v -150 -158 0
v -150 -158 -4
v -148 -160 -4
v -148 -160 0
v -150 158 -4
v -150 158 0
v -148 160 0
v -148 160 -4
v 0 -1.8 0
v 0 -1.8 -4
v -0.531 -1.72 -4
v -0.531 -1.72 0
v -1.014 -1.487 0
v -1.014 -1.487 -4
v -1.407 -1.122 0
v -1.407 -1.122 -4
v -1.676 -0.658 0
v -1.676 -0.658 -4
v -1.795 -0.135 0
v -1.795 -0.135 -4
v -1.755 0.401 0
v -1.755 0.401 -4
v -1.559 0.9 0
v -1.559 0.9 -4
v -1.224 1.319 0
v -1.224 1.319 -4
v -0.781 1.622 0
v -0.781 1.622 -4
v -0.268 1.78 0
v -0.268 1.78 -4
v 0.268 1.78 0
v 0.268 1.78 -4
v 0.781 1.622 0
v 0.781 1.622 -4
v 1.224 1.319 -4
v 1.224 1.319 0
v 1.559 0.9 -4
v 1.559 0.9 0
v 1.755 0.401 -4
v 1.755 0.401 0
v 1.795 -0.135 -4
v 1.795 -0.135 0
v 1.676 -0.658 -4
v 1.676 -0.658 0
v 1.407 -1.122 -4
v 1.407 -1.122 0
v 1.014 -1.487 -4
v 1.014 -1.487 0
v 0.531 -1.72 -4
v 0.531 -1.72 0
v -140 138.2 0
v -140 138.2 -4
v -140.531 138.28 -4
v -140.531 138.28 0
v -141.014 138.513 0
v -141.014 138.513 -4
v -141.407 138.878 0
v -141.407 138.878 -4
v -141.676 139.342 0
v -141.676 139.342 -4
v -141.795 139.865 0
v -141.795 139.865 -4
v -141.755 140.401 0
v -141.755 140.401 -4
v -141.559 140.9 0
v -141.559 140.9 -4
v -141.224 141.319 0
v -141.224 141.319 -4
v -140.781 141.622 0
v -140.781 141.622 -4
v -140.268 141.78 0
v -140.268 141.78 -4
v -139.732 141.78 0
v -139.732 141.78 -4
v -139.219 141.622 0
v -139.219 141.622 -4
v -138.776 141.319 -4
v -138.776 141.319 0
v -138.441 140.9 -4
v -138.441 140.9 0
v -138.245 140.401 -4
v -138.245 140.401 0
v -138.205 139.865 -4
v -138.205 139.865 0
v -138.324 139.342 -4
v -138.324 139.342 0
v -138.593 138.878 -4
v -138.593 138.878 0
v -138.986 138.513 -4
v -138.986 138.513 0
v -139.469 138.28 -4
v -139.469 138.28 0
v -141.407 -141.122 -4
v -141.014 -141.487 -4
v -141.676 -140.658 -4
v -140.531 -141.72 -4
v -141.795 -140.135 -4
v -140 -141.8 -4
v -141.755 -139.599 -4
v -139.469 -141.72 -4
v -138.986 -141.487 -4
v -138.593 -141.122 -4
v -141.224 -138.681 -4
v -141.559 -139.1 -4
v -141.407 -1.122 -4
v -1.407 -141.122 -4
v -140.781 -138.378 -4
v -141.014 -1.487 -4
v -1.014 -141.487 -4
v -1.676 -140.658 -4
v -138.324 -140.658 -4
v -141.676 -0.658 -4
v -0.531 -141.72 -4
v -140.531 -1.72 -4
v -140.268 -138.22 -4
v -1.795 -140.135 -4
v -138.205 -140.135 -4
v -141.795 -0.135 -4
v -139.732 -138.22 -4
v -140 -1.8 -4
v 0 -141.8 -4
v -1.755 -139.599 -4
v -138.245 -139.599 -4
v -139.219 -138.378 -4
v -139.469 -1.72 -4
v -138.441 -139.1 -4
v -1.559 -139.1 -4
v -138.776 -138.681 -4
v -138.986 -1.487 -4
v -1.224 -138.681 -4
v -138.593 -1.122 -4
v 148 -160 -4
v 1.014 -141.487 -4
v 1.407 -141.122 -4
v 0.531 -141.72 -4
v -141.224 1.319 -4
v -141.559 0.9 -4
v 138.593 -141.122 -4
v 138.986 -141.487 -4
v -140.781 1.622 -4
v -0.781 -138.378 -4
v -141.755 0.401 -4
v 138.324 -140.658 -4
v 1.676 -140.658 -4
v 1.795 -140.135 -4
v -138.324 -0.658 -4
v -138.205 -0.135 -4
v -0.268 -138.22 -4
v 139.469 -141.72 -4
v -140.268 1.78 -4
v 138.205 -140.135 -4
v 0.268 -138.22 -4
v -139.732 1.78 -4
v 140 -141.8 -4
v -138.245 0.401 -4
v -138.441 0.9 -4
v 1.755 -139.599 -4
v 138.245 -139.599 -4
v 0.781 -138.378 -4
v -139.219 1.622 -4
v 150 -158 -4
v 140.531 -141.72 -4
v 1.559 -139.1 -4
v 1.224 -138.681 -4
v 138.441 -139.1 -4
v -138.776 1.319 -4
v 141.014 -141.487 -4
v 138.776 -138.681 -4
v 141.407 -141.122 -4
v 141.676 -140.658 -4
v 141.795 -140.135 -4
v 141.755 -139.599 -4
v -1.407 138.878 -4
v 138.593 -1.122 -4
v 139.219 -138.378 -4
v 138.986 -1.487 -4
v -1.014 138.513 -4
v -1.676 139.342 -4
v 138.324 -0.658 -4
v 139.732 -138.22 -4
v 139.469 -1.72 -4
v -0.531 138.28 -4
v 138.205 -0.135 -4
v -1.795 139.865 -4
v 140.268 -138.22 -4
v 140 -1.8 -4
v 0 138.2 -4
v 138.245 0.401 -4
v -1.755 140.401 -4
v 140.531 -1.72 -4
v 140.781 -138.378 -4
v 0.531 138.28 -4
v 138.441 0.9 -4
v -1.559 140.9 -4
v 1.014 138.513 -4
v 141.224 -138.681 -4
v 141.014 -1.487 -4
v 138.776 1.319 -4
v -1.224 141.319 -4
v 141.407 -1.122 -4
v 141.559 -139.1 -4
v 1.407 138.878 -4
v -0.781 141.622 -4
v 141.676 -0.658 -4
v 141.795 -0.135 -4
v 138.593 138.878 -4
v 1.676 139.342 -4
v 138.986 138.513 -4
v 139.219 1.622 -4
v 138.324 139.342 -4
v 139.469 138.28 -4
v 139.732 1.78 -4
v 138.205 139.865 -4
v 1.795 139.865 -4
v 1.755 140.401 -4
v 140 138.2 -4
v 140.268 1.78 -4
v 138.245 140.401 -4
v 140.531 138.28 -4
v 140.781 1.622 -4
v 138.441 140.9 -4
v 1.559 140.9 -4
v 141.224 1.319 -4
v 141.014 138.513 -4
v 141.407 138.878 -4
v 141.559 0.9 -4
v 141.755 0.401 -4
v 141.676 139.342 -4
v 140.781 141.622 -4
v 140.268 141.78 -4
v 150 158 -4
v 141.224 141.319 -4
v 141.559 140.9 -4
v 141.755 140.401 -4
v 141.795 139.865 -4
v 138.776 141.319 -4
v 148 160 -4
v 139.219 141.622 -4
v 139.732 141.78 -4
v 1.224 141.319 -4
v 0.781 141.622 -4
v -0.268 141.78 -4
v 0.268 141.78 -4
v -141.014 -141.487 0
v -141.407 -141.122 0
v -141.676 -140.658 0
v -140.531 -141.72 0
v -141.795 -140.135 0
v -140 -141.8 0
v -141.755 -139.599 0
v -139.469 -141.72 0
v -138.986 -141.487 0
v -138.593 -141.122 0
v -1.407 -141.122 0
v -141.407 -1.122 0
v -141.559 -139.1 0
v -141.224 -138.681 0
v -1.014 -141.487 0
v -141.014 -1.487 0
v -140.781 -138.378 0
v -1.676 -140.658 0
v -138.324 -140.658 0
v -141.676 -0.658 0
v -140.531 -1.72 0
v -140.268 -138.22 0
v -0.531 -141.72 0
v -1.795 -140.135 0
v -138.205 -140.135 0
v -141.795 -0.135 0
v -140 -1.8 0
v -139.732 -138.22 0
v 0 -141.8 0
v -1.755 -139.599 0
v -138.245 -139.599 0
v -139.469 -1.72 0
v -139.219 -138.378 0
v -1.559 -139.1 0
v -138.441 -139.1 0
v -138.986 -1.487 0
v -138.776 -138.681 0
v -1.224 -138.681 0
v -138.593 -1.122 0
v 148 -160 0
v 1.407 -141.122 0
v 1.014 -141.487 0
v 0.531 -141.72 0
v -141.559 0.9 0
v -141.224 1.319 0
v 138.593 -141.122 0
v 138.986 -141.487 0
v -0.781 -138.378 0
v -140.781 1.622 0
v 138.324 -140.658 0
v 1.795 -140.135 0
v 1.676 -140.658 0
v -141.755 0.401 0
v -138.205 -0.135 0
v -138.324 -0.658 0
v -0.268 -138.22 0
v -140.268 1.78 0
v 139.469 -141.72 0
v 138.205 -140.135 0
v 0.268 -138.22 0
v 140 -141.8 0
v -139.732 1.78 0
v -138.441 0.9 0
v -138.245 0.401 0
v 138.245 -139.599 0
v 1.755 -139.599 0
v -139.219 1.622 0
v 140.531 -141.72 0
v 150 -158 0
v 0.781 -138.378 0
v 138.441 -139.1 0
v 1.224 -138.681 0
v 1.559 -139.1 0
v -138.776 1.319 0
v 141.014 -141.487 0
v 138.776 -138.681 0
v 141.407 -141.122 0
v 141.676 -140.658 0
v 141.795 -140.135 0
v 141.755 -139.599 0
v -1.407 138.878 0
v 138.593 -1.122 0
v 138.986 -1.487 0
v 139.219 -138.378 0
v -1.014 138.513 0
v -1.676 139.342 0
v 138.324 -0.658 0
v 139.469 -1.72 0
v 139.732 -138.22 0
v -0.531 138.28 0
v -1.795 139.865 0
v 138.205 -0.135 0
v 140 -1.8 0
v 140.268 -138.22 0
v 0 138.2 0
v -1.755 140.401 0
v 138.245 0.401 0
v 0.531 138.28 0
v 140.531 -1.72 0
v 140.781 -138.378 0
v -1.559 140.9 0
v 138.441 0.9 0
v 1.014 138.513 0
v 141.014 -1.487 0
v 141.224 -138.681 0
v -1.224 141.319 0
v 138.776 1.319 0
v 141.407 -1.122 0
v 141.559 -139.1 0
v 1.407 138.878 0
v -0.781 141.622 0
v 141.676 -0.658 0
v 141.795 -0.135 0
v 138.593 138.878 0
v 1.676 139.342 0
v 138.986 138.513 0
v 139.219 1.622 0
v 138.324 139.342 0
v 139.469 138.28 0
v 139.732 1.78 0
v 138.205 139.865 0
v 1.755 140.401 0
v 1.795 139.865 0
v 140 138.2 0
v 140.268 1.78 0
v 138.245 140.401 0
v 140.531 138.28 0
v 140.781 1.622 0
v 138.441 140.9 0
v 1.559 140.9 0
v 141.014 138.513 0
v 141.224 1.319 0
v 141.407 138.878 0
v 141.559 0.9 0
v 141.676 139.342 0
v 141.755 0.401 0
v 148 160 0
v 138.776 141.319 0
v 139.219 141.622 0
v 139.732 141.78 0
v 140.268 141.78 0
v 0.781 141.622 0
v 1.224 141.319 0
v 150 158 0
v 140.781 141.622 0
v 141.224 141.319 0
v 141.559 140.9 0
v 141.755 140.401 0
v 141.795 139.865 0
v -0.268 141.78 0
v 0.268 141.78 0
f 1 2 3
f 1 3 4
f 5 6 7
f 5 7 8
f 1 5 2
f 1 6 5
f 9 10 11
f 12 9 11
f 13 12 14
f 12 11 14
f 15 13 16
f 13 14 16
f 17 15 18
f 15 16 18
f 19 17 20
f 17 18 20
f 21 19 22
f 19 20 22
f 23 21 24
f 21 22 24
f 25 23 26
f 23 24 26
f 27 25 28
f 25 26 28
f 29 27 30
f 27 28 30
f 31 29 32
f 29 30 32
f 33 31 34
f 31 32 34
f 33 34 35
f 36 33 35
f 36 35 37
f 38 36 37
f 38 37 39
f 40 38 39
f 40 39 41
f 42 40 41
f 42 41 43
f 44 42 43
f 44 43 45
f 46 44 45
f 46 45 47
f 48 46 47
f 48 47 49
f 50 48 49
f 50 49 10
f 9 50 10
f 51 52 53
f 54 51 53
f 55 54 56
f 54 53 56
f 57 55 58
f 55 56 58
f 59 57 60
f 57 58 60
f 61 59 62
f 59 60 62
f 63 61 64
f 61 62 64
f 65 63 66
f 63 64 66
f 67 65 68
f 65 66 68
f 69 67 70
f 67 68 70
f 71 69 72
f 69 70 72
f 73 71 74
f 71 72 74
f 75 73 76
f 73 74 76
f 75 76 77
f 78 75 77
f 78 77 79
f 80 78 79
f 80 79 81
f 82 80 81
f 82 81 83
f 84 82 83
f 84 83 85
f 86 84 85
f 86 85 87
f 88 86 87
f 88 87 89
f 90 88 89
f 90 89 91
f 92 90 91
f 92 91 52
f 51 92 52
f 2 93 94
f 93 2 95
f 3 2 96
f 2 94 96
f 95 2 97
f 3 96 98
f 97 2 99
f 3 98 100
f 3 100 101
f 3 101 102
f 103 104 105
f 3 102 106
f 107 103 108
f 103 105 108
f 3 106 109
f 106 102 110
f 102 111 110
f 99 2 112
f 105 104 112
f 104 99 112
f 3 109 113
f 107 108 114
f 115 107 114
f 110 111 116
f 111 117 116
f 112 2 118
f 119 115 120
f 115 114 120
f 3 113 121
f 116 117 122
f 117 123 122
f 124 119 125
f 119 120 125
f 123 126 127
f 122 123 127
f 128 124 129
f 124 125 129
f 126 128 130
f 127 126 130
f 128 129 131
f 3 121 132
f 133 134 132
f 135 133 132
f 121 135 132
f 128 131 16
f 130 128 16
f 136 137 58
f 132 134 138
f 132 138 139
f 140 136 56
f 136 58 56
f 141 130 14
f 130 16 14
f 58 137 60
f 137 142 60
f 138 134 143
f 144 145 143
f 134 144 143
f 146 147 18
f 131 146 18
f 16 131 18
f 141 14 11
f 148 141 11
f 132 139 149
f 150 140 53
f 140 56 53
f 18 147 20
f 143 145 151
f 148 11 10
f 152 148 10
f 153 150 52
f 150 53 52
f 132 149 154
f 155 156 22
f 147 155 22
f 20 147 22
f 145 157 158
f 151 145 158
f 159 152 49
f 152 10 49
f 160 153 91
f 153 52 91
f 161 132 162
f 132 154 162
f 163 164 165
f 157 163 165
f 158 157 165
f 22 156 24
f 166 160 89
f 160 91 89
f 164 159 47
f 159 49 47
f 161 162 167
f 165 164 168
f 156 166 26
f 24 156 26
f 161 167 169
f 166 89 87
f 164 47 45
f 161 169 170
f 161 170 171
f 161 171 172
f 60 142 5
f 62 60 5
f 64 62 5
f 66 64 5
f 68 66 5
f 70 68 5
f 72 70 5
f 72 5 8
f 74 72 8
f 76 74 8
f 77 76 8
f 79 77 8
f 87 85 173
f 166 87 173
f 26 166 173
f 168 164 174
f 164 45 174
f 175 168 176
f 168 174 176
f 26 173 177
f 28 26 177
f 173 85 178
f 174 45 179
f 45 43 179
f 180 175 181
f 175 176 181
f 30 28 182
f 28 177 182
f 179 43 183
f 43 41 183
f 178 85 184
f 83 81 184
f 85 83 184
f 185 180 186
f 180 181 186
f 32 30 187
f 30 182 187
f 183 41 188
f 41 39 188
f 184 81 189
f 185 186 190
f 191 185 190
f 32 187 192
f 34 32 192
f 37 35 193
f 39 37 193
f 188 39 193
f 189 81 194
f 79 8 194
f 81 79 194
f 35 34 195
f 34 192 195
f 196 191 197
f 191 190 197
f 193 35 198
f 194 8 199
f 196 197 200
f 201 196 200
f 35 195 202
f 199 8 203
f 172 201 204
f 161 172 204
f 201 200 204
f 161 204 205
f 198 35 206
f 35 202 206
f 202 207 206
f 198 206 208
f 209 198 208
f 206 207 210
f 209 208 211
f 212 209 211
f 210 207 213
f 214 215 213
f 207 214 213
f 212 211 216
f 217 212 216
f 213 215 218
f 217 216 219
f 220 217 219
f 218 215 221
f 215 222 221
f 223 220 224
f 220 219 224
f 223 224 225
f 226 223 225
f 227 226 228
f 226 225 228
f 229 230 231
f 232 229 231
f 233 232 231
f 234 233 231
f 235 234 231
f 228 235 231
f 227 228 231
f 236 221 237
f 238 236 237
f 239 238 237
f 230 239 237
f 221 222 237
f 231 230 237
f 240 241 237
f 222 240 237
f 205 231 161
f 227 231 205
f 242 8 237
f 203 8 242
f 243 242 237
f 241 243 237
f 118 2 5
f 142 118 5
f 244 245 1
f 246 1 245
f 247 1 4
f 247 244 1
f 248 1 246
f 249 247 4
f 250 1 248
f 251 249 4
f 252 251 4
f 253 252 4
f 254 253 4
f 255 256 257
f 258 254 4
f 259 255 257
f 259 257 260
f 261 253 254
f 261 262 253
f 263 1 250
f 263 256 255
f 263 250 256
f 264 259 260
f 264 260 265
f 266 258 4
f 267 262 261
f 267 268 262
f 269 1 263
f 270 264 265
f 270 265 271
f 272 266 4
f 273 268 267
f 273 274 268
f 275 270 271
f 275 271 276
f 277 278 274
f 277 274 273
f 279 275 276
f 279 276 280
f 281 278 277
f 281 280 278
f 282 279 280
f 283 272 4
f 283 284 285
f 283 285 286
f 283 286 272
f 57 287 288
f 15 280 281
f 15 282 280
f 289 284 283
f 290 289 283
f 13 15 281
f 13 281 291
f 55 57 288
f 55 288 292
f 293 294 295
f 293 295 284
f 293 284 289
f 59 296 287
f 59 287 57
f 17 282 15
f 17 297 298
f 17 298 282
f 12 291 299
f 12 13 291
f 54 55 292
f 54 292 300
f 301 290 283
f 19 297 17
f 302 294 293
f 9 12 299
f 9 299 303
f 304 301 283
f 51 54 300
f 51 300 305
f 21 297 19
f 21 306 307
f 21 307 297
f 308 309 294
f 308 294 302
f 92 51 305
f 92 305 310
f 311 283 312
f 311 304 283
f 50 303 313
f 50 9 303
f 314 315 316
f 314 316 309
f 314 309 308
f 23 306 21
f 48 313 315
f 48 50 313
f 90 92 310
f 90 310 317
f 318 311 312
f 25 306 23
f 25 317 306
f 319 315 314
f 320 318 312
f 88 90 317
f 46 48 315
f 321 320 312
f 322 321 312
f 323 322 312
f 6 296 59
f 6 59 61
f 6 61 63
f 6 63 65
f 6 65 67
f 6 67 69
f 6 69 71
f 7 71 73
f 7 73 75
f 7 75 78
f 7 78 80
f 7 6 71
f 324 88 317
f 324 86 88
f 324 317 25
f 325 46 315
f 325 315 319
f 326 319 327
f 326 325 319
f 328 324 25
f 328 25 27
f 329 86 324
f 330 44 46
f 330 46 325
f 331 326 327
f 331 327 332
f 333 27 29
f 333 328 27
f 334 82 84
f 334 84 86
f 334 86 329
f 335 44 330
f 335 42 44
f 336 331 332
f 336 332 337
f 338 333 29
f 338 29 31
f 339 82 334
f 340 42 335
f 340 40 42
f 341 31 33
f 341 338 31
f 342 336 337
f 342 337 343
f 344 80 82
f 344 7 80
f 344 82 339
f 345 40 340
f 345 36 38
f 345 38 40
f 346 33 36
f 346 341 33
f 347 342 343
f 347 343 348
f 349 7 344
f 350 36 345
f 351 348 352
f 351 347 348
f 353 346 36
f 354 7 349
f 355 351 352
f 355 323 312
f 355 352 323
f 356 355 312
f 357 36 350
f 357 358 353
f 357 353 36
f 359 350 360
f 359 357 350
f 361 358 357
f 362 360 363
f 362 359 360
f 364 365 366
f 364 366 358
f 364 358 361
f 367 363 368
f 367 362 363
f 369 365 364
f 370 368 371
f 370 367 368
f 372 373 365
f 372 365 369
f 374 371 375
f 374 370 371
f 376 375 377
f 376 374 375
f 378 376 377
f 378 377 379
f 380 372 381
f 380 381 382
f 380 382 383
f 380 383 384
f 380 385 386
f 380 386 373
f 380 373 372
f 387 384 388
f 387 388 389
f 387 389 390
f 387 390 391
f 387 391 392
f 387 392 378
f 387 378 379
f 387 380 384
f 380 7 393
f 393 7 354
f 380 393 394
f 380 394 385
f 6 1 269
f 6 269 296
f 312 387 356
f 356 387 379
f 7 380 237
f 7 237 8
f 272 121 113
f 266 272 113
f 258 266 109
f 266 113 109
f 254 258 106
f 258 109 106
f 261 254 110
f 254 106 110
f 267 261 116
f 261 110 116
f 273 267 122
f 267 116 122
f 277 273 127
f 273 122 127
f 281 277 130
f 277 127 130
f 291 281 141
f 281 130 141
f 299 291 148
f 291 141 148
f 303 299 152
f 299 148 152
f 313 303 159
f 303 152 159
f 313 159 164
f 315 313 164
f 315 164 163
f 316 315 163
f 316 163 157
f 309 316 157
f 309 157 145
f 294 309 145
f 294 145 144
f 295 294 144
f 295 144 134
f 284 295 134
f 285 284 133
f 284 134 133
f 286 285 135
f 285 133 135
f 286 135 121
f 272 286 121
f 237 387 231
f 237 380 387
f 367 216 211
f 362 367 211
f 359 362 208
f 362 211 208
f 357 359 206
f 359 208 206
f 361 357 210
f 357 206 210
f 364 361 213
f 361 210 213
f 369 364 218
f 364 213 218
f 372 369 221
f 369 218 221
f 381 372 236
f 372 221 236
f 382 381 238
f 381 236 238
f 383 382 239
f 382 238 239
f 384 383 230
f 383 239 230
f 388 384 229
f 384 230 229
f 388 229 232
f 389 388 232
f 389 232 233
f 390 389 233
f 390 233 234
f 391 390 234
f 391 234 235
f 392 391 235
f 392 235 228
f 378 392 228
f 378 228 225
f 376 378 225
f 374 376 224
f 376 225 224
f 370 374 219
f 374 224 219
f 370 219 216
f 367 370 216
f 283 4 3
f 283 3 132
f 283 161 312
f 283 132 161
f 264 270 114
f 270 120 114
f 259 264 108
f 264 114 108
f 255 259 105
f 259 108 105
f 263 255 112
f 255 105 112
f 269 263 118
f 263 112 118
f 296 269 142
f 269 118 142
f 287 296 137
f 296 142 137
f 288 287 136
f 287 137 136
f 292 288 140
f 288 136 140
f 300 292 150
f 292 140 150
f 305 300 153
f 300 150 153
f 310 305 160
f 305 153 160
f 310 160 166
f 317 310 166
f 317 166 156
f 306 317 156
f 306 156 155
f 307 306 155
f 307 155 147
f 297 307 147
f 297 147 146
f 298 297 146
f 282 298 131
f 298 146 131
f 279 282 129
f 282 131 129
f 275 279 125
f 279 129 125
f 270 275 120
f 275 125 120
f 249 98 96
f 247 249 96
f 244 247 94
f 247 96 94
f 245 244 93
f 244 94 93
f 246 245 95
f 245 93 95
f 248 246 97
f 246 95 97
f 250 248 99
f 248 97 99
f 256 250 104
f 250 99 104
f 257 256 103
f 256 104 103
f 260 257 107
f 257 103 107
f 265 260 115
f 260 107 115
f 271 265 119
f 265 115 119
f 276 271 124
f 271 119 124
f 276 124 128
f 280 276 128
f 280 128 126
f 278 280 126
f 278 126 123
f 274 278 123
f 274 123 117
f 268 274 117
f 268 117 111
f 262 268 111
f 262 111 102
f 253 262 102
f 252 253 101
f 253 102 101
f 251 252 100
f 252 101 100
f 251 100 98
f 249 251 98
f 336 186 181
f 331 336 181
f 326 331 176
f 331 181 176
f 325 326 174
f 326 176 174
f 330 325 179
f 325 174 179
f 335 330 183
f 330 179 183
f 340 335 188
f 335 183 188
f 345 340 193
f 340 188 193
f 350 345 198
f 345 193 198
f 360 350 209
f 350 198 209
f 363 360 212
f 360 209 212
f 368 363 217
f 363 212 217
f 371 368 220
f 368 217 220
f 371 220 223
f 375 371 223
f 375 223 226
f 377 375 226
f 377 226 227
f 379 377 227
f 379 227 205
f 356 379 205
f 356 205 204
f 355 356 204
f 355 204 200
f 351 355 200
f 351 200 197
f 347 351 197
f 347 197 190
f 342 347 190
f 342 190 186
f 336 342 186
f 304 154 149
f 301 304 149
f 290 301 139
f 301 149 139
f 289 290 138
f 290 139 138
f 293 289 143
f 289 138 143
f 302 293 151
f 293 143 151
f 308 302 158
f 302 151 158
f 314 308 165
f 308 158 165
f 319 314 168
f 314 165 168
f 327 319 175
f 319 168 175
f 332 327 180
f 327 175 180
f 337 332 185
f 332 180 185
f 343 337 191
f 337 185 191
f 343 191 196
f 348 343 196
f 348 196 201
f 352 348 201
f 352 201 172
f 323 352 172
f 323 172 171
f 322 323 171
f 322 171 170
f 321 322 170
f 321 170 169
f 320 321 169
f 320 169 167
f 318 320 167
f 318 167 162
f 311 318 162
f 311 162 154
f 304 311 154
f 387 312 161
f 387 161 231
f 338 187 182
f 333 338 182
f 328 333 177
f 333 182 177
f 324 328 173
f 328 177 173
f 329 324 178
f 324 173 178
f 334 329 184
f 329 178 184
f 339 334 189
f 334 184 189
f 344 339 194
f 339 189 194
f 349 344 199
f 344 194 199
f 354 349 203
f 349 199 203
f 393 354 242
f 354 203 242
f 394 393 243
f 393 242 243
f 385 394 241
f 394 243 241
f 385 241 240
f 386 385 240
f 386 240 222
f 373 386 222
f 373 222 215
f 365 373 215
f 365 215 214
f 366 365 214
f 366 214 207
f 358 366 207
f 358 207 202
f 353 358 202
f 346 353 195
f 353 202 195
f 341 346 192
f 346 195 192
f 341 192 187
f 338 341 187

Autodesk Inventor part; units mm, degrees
ref_plane "YZ Plane" through (0, 0, 0) normal (1, 0, 0) x (0, 1, 0)
ref_plane "XZ Plane" through (0, 0, 0) normal (0, 1, 0) x (-1, 0, 0)
ref_plane "XY Plane" through (0, 0, 0) normal (0, 0, 1) x (1, 0, 0)
sketch "Sketch1" plane through (0, 0, 0) normal (0, 0, 1) x (1, 0, 0)
  line L0 (150, 160) -> (-150, 160)
  line L1 (-150, 160) -> (-150, -160)
  line L2 (-150, -160) -> (150, -160)
  line L3 (150, -160) -> (150, 160)
  line L4 (150, 160) -> (-150, -160) construction
  line L5 (-150, 160) -> (150, -160) construction
  point P0 (0, 0)
  point P1 (0, 0)
  dimension "d0" = 300
  dimension "d1" = 320
extrude "Extrusion1" add sketch "Sketch1" against normal blind 4
hole "Hole1" at (0, 0, 0) direction (0, 0, -1) diameter 3.6 end through all
chamfer "Chamfer1" distance 2 angle 45 4 edges at (150, 160, -2) (150, -160, -2) (-150, 160, -2) (-150, -160, -2)
pattern_linear "Rectangular Pattern1" count 3 spacing 140 along (1, 0, 0) count 3 spacing 140 along (0, 1, 0) of "Hole1" first direction both ways yes second direction both ways yes
properties part number "caddy2"
